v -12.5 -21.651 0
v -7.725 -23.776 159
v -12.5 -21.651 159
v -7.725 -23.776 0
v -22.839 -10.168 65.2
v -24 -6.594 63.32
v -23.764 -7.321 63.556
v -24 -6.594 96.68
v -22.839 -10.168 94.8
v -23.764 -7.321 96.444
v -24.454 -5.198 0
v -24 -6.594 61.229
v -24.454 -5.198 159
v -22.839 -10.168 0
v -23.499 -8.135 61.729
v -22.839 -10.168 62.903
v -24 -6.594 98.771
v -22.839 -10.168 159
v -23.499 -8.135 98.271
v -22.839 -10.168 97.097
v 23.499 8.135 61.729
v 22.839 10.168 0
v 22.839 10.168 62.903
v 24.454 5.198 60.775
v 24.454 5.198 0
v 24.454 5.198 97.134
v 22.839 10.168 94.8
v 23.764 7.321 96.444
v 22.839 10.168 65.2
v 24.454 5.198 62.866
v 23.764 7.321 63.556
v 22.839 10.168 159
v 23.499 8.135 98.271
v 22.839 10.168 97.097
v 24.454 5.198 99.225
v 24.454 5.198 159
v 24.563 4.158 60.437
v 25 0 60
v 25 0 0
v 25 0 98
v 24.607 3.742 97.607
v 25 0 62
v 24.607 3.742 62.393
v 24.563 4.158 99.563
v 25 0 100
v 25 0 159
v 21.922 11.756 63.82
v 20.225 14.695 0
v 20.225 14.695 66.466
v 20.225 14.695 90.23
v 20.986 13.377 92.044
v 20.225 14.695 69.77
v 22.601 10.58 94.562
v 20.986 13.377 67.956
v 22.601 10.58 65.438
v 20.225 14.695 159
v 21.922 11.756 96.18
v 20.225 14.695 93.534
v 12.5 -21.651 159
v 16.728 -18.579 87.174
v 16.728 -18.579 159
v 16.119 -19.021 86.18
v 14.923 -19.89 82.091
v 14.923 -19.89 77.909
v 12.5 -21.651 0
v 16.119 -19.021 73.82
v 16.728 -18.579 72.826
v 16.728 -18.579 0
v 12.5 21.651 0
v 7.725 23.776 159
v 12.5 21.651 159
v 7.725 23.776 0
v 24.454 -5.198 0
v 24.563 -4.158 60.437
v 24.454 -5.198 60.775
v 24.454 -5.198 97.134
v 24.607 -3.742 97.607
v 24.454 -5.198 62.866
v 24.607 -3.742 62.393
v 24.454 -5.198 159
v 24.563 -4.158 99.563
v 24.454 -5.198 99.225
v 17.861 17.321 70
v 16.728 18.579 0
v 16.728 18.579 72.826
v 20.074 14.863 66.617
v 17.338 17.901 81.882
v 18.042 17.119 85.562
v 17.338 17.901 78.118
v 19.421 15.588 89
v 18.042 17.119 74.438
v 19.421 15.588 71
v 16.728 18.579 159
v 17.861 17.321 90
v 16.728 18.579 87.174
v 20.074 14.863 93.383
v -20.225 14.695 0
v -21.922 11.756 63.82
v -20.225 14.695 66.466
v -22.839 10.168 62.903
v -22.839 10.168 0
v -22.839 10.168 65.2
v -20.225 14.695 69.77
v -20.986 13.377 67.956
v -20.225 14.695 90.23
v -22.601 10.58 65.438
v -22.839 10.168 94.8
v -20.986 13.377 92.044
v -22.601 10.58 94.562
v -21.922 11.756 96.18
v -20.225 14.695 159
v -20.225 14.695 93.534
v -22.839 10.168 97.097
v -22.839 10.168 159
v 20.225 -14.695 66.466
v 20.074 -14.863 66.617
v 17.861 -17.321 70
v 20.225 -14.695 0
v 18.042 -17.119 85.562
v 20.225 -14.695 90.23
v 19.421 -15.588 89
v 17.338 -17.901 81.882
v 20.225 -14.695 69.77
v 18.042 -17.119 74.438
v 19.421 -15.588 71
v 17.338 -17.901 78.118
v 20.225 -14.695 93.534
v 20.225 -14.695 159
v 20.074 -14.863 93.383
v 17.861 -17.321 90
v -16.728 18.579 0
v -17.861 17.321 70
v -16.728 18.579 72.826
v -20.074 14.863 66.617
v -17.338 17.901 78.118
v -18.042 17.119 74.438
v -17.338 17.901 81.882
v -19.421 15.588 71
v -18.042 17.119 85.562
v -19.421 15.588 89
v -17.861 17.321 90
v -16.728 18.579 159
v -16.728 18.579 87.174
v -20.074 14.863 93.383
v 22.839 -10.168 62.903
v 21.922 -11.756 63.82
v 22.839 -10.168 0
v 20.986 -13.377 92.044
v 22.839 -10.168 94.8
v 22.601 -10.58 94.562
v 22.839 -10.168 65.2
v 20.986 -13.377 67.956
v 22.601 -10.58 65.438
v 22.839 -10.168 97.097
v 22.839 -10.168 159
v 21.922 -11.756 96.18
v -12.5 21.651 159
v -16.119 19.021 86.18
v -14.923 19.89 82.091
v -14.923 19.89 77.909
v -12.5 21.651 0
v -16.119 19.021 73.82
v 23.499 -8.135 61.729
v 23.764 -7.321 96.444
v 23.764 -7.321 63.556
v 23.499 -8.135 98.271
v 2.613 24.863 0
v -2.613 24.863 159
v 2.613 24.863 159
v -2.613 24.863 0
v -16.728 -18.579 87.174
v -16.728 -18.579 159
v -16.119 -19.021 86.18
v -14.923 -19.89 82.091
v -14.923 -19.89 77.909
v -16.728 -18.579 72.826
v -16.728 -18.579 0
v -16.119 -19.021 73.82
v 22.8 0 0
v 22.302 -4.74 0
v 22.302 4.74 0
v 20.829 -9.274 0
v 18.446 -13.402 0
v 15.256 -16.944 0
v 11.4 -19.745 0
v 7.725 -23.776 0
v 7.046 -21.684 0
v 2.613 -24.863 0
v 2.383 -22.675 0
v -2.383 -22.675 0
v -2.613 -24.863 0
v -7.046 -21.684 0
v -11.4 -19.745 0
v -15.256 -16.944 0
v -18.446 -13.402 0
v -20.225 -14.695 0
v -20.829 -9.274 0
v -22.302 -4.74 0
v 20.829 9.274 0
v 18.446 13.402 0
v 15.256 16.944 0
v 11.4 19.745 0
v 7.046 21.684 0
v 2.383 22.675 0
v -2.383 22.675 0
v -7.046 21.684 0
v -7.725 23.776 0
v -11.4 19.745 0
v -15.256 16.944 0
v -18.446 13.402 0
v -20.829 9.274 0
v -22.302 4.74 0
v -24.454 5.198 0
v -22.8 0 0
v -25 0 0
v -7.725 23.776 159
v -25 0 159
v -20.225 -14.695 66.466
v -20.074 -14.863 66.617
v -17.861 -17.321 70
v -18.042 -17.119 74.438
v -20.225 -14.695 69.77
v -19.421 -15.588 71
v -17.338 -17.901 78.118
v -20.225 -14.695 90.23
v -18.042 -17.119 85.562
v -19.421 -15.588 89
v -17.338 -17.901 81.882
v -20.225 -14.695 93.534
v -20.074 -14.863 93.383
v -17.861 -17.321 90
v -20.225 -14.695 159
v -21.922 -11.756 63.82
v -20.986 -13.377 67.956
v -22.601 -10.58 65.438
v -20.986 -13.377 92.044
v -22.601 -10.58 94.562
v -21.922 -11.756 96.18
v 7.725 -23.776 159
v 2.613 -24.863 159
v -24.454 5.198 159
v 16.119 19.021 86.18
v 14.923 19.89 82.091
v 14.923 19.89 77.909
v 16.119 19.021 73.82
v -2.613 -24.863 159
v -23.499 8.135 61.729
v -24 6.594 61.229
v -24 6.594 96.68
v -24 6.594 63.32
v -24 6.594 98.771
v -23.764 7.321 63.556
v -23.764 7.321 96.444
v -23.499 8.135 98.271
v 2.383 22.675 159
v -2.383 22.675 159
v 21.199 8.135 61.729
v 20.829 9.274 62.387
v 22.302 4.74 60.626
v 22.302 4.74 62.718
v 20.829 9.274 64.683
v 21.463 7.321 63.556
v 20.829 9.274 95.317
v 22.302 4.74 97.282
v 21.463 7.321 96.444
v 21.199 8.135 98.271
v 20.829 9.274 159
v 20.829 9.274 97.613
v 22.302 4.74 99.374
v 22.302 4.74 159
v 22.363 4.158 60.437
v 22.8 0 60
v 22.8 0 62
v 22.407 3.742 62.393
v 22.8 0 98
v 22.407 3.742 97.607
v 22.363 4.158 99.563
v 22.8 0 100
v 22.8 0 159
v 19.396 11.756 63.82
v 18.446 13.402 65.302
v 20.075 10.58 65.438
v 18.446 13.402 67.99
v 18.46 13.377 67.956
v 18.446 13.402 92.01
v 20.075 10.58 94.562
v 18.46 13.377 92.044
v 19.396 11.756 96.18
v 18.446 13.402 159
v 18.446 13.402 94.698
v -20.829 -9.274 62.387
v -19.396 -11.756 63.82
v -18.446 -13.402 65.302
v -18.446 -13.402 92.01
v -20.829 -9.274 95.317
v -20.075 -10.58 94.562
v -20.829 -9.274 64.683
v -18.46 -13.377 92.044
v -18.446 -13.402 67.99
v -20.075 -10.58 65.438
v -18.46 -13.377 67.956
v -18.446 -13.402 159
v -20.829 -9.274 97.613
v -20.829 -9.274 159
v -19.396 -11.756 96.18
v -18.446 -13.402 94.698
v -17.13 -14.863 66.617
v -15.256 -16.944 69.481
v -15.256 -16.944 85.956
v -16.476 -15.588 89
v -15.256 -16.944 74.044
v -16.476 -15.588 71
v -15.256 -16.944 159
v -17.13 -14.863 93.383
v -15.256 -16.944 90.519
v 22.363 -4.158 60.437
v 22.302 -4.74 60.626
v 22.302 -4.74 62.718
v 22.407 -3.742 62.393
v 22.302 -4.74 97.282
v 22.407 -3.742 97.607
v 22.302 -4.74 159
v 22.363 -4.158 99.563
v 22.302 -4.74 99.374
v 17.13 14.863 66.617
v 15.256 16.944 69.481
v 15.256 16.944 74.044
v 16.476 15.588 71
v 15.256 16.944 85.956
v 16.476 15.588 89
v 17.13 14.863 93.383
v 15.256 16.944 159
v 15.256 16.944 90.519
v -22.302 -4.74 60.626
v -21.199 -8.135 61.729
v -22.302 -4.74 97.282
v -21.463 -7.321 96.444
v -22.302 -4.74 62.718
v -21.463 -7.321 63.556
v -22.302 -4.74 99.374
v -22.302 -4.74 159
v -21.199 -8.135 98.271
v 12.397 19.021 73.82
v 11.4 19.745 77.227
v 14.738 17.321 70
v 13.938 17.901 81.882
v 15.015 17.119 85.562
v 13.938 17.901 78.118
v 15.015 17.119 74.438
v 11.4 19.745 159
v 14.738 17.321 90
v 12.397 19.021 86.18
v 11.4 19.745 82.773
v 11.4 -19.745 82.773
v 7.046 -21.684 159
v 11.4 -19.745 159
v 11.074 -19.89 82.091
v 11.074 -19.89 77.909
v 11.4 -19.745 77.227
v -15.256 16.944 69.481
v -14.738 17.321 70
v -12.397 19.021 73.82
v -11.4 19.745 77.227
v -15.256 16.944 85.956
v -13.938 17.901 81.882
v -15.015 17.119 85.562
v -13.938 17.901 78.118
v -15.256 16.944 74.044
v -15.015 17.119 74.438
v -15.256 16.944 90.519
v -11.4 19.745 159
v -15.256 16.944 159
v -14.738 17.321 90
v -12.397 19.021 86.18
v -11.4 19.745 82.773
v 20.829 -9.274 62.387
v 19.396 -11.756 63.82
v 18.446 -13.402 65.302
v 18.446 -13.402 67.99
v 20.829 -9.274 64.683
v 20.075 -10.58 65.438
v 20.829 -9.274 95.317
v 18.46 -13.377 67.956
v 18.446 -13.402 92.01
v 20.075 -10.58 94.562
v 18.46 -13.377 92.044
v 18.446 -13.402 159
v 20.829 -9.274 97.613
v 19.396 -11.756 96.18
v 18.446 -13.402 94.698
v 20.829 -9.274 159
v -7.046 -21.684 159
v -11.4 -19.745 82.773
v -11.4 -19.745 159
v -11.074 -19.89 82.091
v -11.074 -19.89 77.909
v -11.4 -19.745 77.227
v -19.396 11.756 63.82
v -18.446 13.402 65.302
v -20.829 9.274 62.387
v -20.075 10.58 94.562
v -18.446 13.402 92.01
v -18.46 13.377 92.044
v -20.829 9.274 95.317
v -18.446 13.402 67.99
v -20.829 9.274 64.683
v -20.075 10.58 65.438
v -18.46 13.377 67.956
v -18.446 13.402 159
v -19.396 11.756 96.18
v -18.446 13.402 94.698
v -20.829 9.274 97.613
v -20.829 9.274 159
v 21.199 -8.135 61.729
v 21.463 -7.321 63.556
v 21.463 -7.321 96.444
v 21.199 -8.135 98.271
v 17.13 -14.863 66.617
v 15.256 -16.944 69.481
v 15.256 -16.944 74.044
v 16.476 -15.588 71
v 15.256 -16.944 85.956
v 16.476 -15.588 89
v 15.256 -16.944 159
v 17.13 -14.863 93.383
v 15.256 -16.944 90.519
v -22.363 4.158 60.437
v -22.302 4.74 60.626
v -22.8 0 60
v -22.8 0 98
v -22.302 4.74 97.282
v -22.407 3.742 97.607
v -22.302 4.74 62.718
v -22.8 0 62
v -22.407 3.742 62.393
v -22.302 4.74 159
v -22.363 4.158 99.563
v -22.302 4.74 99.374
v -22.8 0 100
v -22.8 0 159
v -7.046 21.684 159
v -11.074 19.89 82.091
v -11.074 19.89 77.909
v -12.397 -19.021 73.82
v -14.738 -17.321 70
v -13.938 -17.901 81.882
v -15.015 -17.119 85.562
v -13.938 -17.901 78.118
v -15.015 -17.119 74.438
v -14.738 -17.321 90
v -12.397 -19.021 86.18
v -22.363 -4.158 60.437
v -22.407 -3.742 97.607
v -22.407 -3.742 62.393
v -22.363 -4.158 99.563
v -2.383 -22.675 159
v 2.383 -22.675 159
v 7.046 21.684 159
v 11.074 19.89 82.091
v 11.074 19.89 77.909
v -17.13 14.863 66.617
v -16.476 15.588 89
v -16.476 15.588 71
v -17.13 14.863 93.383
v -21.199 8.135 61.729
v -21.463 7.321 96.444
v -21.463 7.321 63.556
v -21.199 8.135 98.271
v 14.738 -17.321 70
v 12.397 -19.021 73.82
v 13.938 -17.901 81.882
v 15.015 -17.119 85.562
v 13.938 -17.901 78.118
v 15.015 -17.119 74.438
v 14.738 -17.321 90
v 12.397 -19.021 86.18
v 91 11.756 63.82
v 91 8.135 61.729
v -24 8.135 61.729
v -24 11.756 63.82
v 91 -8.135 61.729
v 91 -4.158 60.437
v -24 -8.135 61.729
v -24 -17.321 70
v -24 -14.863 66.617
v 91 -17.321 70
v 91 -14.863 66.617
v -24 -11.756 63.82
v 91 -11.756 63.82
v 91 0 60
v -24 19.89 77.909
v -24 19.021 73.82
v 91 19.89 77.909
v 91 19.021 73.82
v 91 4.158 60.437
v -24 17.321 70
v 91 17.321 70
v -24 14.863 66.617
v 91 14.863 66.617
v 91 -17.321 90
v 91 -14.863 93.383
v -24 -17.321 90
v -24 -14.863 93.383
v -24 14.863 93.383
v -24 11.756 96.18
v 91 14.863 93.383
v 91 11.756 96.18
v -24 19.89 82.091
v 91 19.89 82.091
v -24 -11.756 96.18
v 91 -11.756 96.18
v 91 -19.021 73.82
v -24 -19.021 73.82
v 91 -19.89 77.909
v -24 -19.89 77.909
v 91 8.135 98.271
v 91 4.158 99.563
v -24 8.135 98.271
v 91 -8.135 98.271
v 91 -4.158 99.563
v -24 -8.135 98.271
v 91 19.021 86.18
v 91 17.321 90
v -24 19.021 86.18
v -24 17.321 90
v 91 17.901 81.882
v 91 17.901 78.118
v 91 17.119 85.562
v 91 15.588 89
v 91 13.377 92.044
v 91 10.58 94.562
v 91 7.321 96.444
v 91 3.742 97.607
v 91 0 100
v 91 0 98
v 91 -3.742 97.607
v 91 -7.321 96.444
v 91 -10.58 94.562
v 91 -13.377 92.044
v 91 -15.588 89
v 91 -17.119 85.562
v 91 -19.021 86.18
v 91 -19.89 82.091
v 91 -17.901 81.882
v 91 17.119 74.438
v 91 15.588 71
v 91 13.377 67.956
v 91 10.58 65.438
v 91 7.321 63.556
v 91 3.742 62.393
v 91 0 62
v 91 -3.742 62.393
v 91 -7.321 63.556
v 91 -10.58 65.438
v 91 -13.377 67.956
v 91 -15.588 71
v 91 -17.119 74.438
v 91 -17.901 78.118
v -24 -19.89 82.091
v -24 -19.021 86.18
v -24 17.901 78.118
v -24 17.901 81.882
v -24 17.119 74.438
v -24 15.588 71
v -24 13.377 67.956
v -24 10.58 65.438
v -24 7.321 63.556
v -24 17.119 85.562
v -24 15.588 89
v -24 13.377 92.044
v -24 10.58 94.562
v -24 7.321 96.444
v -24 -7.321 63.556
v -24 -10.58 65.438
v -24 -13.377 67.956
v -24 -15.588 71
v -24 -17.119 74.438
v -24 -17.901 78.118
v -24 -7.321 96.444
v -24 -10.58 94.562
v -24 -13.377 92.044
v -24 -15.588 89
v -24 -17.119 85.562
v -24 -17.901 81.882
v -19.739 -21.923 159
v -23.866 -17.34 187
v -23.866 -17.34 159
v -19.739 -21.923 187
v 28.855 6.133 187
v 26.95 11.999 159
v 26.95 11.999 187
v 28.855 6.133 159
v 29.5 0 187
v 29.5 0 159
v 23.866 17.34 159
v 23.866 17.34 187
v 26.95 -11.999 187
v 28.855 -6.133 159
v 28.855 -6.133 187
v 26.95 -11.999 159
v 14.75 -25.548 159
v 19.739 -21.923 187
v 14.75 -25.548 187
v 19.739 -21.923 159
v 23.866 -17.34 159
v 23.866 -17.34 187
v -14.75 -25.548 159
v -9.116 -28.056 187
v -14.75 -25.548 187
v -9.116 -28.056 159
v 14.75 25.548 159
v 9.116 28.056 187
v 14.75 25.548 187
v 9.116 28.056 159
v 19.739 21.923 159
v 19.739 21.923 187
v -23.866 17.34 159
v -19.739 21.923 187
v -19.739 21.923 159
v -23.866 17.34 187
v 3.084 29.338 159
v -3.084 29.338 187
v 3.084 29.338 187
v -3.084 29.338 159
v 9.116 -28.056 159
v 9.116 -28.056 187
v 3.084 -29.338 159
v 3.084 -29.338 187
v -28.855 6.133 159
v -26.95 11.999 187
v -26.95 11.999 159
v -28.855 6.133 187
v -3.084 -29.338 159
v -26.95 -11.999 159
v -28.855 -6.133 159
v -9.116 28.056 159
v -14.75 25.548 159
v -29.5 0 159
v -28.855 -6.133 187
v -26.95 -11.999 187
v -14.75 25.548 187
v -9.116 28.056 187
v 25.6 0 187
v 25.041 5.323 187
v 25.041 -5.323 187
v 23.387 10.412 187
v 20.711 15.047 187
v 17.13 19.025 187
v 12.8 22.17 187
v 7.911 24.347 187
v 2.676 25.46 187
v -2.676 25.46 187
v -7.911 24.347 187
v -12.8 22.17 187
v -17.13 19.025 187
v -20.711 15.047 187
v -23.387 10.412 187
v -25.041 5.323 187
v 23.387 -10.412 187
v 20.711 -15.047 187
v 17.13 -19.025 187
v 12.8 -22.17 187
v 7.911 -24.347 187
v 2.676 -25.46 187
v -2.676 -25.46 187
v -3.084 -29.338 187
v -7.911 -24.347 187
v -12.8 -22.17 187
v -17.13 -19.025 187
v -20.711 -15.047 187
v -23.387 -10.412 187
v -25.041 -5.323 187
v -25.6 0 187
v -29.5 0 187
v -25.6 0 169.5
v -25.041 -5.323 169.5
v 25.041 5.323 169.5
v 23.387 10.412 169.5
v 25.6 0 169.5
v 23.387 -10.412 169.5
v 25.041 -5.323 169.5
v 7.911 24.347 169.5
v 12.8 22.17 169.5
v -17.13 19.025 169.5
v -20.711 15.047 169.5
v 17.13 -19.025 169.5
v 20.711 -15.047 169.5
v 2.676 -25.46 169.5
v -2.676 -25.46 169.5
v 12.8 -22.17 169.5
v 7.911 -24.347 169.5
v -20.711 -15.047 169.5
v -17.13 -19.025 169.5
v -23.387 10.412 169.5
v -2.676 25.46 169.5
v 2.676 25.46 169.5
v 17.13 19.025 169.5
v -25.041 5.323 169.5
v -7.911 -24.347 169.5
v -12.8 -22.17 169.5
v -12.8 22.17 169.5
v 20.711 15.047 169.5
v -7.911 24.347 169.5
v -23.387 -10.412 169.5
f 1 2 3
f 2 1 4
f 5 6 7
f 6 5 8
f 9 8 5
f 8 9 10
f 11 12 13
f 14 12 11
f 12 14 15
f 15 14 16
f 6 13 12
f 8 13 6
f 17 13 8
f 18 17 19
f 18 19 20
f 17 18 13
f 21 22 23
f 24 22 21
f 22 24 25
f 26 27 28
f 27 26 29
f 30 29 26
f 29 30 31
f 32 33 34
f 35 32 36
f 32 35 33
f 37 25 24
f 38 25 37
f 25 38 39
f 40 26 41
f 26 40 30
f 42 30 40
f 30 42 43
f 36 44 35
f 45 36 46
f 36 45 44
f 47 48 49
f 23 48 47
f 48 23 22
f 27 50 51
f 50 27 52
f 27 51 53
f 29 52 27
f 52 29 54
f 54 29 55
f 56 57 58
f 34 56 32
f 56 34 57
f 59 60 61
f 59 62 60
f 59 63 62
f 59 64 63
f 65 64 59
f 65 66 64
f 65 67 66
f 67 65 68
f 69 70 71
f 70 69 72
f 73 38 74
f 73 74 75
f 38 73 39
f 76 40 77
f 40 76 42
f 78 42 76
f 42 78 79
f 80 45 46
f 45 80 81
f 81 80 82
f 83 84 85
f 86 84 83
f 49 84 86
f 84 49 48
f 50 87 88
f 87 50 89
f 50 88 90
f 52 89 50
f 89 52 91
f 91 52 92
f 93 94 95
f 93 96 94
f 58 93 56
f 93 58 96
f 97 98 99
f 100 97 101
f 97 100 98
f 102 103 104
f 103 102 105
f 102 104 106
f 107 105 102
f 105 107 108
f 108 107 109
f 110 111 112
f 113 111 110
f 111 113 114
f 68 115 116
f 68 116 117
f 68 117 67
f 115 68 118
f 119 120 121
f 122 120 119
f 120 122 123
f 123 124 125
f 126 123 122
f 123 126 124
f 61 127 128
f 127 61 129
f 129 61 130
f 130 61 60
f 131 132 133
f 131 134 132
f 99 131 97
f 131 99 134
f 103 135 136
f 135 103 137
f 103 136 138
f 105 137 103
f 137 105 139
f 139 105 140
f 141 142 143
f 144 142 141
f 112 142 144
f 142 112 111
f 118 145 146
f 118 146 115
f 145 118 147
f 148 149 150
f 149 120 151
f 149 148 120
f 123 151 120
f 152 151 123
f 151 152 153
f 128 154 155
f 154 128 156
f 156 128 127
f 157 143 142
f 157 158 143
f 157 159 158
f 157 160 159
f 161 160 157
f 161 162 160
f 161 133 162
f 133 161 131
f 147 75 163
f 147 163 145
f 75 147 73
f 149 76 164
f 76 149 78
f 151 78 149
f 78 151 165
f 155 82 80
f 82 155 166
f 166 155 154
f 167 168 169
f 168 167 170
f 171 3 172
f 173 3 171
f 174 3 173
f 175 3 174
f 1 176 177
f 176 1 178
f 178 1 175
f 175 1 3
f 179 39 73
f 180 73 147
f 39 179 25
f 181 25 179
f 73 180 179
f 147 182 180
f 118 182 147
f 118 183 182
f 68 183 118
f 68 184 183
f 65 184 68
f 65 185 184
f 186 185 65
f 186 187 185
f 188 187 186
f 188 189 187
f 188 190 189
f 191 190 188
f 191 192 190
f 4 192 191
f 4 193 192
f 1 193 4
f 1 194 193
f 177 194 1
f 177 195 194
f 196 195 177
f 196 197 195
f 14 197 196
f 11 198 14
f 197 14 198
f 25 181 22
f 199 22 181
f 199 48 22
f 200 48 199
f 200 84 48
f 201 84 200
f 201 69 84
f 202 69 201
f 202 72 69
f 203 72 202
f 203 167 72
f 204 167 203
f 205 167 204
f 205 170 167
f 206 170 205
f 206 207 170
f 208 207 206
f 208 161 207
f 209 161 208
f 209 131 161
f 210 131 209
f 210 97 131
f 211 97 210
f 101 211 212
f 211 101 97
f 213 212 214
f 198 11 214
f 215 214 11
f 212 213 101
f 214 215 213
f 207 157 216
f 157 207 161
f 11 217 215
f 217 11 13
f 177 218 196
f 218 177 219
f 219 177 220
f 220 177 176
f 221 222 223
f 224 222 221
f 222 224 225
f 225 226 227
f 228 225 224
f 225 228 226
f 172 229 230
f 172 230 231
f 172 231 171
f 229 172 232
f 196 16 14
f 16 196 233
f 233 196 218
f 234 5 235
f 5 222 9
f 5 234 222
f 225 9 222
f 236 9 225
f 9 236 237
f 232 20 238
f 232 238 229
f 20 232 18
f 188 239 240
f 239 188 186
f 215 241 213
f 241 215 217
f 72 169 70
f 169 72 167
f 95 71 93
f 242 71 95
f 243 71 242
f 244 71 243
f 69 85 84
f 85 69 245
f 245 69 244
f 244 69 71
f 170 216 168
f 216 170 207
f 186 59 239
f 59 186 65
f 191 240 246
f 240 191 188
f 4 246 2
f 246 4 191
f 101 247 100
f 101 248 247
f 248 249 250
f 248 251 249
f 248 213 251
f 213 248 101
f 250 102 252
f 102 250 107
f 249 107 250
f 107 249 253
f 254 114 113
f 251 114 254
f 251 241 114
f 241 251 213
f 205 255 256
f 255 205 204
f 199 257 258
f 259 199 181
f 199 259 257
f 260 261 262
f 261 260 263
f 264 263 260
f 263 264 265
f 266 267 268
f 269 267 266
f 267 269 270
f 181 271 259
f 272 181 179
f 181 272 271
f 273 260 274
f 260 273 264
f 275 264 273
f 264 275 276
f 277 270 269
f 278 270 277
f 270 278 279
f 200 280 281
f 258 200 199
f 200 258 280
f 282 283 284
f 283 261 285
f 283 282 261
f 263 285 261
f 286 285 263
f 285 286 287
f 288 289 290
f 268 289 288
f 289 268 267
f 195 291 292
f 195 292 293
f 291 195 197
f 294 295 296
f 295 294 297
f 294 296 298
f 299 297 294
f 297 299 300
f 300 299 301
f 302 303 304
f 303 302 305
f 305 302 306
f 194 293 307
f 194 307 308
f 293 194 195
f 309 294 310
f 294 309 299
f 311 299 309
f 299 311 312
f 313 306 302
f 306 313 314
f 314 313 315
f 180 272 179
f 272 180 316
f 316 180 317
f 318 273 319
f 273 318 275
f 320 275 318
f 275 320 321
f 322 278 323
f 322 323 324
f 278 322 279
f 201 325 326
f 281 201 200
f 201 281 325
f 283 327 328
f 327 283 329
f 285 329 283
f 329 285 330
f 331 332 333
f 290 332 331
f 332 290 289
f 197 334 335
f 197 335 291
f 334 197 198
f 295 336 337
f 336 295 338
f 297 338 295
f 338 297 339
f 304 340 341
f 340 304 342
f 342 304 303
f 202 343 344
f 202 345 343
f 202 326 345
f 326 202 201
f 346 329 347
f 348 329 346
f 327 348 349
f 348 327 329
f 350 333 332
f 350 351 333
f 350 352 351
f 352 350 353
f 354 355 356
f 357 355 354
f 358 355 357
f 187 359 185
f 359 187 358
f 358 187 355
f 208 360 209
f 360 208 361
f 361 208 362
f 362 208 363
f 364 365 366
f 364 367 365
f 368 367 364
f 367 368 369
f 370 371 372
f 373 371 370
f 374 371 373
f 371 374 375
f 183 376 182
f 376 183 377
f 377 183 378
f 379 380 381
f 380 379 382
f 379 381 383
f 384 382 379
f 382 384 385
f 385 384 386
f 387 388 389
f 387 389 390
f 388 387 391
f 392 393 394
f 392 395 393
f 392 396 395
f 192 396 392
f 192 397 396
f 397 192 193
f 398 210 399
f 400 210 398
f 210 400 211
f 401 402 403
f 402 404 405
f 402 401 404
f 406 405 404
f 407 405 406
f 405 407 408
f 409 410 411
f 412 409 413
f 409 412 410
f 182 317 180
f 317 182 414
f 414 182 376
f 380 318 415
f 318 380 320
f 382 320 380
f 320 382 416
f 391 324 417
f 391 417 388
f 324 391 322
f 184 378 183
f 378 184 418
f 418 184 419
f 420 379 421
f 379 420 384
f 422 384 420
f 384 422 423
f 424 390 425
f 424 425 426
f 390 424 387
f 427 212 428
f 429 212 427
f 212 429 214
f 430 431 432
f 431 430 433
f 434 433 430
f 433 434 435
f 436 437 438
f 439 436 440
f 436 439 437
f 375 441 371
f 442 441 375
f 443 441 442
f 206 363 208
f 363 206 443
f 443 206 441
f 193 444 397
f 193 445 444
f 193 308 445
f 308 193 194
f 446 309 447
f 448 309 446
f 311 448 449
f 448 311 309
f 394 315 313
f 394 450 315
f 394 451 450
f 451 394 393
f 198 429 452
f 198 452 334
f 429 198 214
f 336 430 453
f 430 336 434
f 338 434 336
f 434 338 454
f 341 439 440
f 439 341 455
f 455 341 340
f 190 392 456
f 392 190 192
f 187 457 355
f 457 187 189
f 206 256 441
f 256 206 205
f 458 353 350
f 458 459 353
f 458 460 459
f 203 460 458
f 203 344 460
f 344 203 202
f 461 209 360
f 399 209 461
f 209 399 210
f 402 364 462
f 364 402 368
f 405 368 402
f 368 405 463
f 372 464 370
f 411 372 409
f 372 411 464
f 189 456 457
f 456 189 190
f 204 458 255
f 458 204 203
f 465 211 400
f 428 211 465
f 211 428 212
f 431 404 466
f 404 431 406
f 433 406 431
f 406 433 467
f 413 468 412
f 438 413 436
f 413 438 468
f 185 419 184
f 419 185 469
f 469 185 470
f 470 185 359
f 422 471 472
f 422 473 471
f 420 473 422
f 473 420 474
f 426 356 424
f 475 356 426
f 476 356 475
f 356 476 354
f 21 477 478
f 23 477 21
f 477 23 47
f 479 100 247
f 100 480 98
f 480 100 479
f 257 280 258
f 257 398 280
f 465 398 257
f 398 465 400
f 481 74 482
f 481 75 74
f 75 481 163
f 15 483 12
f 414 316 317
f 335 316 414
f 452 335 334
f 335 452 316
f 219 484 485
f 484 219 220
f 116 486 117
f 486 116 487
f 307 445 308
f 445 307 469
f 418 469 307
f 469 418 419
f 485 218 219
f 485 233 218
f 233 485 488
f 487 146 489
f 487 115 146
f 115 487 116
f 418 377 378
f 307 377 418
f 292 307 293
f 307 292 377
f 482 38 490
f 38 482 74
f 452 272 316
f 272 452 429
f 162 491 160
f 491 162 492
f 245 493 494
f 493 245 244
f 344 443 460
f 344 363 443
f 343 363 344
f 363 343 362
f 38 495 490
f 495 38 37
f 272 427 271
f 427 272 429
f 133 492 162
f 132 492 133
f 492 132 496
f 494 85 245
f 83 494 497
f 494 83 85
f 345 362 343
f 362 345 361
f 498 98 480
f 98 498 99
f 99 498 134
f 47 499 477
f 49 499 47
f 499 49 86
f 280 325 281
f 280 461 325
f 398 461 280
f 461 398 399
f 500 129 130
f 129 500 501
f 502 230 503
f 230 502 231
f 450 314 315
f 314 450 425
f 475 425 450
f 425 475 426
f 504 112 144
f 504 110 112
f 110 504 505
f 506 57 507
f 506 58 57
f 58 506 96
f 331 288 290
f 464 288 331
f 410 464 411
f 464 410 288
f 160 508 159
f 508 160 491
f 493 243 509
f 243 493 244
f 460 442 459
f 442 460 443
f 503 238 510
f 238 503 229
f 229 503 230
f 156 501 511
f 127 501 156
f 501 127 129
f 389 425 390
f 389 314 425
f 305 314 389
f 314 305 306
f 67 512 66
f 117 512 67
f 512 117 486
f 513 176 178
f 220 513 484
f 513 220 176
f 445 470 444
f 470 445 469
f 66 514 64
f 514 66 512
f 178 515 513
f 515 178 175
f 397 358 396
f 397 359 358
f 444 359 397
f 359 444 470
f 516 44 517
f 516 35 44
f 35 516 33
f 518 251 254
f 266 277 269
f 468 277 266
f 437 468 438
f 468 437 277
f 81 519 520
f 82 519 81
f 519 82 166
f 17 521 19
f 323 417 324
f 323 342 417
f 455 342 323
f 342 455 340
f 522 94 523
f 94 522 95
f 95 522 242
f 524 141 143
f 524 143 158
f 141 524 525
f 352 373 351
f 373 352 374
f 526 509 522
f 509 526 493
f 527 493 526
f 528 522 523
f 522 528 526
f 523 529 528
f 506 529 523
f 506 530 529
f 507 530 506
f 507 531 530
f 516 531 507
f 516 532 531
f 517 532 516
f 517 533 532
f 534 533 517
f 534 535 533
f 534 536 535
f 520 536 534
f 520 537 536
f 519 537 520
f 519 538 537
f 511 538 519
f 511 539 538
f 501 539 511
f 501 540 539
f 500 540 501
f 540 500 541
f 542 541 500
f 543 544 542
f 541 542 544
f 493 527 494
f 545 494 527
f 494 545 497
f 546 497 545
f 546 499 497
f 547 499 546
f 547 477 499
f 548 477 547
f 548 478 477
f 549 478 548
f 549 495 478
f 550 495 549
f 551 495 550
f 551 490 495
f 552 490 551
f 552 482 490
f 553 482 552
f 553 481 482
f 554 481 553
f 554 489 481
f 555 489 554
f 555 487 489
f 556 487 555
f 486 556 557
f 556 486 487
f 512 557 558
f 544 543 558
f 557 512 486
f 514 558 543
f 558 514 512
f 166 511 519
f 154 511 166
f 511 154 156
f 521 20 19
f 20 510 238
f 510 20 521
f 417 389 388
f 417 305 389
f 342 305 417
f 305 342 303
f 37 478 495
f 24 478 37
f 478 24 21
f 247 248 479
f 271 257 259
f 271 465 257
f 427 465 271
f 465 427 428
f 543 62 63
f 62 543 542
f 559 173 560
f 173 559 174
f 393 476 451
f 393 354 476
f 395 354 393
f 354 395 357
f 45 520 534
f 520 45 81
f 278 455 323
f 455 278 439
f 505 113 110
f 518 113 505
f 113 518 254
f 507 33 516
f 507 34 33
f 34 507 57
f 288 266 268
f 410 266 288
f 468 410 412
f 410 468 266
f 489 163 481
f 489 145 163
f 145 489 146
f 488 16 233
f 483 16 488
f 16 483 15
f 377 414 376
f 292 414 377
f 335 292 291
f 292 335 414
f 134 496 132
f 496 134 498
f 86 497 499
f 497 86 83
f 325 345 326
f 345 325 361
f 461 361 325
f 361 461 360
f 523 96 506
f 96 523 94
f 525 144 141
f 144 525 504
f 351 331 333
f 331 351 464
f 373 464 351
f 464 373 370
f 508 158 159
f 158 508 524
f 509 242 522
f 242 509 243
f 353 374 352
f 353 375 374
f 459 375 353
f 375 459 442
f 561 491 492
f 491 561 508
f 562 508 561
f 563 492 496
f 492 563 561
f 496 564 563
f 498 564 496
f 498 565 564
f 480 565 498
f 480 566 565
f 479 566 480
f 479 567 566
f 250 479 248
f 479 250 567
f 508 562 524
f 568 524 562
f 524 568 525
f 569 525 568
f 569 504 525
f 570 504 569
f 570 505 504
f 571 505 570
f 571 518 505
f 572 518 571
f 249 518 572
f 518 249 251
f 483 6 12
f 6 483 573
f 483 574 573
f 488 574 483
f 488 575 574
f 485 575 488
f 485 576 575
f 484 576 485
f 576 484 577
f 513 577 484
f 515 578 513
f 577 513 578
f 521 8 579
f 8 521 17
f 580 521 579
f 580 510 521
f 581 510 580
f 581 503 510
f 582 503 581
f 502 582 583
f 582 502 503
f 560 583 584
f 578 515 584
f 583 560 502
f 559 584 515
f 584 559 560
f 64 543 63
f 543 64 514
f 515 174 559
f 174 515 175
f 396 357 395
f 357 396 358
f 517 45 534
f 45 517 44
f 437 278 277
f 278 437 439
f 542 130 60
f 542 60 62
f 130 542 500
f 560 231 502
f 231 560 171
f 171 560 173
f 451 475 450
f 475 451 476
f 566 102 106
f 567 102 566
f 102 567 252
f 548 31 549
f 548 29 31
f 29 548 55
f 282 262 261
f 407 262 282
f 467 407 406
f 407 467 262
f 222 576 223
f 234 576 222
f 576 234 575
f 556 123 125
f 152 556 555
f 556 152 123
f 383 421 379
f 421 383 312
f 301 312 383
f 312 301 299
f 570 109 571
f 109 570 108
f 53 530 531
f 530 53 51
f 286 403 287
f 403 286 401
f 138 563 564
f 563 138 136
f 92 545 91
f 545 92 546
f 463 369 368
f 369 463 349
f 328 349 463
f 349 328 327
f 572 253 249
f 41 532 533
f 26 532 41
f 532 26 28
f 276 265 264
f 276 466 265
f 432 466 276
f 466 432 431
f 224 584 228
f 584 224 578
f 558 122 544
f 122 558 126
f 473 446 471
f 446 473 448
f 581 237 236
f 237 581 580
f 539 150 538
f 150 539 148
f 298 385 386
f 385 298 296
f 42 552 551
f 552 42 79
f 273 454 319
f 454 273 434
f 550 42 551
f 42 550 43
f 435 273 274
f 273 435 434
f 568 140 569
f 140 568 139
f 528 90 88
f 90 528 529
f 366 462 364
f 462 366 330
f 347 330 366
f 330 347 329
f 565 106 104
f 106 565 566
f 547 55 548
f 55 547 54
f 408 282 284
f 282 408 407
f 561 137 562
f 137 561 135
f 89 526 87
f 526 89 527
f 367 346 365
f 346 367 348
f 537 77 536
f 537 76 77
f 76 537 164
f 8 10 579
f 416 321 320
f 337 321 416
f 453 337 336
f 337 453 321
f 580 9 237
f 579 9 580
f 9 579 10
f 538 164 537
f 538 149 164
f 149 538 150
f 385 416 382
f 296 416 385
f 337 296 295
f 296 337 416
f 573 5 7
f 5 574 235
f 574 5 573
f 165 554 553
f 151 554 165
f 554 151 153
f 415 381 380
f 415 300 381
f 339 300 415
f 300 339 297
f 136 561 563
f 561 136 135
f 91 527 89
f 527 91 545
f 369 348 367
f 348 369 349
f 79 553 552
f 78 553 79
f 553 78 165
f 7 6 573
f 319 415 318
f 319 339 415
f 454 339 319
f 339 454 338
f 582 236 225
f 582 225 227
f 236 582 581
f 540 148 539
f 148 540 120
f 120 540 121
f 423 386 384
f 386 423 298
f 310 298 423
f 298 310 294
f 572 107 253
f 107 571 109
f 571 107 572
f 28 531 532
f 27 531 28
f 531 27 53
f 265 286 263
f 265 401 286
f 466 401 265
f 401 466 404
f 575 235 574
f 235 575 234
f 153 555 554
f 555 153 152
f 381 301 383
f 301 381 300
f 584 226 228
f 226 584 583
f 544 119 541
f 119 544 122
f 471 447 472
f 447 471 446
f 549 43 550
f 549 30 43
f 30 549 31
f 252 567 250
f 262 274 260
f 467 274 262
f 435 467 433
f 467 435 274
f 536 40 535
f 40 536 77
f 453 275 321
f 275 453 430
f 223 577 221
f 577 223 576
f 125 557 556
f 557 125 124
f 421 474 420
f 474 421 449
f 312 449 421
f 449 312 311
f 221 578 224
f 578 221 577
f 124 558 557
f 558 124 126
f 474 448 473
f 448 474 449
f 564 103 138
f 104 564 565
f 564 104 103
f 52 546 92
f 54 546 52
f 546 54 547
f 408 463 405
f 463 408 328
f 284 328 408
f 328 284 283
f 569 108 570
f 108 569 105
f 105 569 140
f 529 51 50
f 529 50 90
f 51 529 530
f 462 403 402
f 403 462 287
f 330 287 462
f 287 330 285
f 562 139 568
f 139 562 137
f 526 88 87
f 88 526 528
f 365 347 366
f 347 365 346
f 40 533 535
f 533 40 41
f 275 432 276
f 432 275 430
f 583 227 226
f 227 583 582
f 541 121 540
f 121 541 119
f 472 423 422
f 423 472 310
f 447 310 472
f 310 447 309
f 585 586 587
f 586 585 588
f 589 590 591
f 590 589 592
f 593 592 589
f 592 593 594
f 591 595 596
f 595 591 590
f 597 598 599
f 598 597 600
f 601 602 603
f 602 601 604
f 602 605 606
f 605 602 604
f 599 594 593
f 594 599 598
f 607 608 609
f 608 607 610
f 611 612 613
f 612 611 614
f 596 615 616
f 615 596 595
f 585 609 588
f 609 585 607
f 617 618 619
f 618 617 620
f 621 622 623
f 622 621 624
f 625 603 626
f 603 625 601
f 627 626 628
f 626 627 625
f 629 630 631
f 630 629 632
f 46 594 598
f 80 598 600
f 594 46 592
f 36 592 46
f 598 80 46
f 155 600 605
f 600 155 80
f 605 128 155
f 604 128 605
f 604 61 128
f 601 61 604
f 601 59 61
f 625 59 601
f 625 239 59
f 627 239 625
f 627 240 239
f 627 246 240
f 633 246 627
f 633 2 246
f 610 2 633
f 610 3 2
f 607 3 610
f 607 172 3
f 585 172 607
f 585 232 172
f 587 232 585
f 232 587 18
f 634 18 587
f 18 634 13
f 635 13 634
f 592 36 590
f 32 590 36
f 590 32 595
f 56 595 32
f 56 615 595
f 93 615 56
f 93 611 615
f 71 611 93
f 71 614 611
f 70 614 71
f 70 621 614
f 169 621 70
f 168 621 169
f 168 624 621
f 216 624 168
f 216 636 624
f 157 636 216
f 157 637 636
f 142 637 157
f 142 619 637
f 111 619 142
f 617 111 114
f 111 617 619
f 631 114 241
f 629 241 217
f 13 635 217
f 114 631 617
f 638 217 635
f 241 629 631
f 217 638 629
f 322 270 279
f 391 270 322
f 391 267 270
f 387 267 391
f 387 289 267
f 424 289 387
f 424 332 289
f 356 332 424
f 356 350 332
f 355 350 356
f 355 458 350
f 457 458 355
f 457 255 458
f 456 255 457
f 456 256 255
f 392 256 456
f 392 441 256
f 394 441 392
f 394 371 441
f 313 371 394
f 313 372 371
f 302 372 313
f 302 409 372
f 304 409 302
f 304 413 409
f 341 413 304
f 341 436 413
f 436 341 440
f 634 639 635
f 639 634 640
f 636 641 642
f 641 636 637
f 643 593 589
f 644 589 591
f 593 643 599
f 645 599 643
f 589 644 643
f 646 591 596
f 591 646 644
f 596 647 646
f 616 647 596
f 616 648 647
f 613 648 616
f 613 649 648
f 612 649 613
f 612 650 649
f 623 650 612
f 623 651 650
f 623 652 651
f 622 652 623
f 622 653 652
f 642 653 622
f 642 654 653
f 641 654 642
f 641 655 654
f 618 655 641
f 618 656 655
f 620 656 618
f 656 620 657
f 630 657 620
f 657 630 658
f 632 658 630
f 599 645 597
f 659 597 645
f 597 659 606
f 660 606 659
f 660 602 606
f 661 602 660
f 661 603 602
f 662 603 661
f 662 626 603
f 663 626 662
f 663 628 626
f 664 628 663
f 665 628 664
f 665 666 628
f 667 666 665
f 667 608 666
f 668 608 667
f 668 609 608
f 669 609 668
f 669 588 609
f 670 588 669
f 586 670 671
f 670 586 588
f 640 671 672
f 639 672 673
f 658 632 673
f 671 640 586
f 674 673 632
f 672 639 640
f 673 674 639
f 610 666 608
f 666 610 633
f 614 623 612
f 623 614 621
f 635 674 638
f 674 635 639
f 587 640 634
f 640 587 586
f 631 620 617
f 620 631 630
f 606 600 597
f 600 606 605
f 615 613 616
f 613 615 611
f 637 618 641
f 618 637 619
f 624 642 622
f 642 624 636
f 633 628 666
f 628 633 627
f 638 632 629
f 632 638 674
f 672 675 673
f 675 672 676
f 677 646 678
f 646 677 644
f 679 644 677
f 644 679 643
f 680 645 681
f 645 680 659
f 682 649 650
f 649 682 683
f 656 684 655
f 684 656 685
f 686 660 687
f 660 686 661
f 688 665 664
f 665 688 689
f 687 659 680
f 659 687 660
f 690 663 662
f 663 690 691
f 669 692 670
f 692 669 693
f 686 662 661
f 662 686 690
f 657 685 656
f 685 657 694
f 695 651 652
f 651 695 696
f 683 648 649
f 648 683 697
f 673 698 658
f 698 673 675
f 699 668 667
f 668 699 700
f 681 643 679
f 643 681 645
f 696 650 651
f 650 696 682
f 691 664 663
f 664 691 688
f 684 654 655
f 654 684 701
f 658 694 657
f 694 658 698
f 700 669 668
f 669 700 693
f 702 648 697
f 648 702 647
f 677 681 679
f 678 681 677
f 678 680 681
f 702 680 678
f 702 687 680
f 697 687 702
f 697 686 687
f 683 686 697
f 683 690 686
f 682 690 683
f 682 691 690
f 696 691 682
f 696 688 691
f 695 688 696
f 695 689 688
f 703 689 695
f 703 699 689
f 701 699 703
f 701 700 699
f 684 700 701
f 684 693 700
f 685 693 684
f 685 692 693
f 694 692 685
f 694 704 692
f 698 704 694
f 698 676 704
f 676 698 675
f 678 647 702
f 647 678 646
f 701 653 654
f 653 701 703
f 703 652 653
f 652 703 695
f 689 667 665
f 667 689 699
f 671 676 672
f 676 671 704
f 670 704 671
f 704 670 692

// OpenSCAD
// Parameters
main_diameter_mm = 50; //[25:100]
branch_diameter_mm = 40; //[20:80]
length_mm = 160; //[80:320]
branch_length_mm = 90; //[45:180]
wall_thickness_mm = 2.2; //[1.1:4.4]
branch_wall_thickness_mm = 2.0; //[1.0:4.0]
fitting_height_mm = 28; //[14:56]
fitting_od_scale = 1.18; //[1.05:1.4]
socket_depth_mm = 18; //[9:36]
socket_clearance_mm = 0.6; //[0.2:1.2]
overlap_mm = 1; //[0.5:2]

// Main HT Pipe Body
module ht_pipe_body() {
  difference() {
    cylinder(r=main_diameter_mm/2, h=length_mm, center=false);
    translate([0, 0, -overlap_mm/2])
      cylinder(r=main_diameter_mm/2 - wall_thickness_mm, h=length_mm + overlap_mm, center=false);
  }
}

// Branch Tube
module branch_tube() {
  difference() {
    translate([-(main_diameter_mm/2 - overlap_mm), 0, length_mm/2])
      rotate([0, 90, 0])
      cylinder(r=branch_diameter_mm/2, h=branch_length_mm + main_diameter_mm/2, center=false);
    translate([-(main_diameter_mm/2 - overlap_mm) - overlap_mm/2, 0, length_mm/2])
      rotate([0, 90, 0])
      cylinder(r=branch_diameter_mm/2 - branch_wall_thickness_mm, h=branch_length_mm + main_diameter_mm/2 + overlap_mm, center=false);
  }
}

// Integrated End Fitting
module integrated_end_fitting() {
  difference() {
    translate([0, 0, length_mm - overlap_mm])
      cylinder(r=(main_diameter_mm/2) * fitting_od_scale, h=fitting_height_mm, center=false);
    translate([0, 0, length_mm + fitting_height_mm - socket_depth_mm - overlap_mm/2])
      cylinder(r=main_diameter_mm/2 + socket_clearance_mm, h=socket_depth_mm + overlap_mm, center=false);
  }
}

// Complete HT Pipe Assembly
module ht_pipe() {
  union() {
    ht_pipe_body();
    branch_tube();
    integrated_end_fitting();
  }
}

// Final Assembly
module assembly() {
  color([0.85, 0.85, 0.8]) // PVC color
    ht_pipe();
}

assembly();
